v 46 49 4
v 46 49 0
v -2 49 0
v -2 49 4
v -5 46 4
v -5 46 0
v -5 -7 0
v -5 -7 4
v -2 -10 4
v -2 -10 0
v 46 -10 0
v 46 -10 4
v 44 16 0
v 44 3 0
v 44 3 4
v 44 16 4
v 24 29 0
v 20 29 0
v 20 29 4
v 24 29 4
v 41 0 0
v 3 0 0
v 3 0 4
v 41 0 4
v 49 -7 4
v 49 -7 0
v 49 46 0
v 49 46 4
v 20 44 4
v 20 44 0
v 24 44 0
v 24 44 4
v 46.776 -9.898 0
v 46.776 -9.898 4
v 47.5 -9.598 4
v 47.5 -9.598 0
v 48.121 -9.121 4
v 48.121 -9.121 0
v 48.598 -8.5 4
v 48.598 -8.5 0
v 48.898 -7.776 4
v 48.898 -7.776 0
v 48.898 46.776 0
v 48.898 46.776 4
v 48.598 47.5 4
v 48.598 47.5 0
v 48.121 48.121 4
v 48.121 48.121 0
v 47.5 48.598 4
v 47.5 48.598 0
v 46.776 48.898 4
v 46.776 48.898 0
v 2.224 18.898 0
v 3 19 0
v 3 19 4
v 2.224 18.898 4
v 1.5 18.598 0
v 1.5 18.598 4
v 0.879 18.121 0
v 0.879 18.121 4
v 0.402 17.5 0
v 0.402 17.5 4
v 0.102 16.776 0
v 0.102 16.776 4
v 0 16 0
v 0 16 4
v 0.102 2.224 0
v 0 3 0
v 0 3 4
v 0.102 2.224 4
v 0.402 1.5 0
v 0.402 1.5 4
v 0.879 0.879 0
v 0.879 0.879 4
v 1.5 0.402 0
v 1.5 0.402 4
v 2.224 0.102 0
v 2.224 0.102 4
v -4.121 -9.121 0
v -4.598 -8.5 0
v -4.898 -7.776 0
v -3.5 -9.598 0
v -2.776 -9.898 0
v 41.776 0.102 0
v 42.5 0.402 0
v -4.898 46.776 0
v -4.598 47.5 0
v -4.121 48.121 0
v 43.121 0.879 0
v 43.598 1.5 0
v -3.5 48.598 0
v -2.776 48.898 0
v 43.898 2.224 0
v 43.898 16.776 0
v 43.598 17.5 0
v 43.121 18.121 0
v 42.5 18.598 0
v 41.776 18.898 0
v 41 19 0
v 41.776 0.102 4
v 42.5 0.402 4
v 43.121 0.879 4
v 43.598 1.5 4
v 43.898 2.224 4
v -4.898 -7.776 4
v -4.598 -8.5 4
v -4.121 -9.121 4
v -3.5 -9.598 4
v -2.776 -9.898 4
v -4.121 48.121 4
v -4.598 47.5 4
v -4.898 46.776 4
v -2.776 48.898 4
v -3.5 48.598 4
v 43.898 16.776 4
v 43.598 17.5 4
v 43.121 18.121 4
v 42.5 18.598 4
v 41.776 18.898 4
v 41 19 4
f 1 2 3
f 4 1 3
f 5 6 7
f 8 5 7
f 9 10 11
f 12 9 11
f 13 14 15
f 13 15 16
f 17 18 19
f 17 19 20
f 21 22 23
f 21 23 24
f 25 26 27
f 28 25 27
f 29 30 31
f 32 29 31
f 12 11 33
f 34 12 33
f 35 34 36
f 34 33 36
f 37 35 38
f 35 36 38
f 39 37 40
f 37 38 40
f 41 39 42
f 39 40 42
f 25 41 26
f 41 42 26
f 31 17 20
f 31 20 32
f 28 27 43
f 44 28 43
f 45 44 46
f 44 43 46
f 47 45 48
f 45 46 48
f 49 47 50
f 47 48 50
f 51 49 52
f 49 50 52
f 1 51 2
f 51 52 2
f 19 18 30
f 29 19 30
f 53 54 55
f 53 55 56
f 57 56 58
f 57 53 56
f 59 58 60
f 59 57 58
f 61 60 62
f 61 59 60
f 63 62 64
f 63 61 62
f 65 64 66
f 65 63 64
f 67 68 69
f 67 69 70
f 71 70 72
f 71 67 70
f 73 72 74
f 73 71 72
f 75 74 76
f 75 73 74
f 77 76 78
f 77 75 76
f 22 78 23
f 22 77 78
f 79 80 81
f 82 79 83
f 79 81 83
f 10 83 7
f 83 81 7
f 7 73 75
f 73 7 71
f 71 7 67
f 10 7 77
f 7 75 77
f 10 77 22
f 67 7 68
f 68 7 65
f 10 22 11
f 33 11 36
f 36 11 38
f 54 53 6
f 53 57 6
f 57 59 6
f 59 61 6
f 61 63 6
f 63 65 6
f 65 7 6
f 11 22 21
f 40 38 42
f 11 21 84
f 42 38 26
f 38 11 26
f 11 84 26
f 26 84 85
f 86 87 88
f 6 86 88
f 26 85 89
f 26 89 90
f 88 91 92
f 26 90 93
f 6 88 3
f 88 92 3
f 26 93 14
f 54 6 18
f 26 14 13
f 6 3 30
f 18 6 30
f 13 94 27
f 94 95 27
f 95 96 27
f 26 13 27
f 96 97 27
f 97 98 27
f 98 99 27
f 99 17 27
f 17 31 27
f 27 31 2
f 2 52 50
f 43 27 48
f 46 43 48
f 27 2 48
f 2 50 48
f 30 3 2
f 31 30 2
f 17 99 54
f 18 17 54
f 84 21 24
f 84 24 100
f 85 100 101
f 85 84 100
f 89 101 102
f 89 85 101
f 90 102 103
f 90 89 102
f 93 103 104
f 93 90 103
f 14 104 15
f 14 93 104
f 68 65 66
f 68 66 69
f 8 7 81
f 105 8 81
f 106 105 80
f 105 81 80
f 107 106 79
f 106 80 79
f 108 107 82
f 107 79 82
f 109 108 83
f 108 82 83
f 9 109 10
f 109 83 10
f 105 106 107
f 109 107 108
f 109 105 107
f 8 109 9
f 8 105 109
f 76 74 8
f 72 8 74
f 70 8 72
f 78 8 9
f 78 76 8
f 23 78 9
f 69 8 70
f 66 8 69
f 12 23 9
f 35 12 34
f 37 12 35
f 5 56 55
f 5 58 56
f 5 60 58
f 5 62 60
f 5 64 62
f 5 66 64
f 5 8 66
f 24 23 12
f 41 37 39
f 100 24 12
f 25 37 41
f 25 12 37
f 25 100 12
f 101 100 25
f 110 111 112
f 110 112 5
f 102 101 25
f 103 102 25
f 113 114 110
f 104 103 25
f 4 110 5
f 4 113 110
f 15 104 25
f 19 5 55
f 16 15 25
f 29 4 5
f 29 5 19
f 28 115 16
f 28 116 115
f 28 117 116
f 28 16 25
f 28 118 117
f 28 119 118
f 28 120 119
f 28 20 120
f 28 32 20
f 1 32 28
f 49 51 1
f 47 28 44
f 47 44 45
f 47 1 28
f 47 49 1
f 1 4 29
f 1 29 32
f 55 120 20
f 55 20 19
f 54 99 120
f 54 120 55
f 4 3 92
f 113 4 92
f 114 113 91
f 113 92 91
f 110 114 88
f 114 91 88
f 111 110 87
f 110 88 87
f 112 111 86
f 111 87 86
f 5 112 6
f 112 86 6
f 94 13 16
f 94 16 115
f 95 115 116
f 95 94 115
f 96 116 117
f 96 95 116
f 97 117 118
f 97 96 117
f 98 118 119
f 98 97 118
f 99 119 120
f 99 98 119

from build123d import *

# Parameters (mm, degrees)
SKETCH1_W           = 4
SKETCH1_H           = 15
BOSS_EXTRUDE1_DEPTH = 4


with BuildPart() as part:
    # Sketch1 → Boss-Extrude1 (new body)
    with BuildSketch(Plane.XY):
        with BuildLine():
            Line((-2, -10), (46, -10))
            ThreePointArc((46, -10), (48.121320344, -9.121320344), (49, -7))
            Line((49, -7), (49, 46))
            ThreePointArc((49, 46), (48.121320344, 48.121320344), (46, 49))
            Line((46, 49), (-2, 49))
            ThreePointArc((-2, 49), (-4.121320344, 48.121320344), (-5, 46))
            Line((-5, 46), (-5, -7))
            ThreePointArc((-5, -7), (-4.121320344, -9.121320344), (-2, -10))
        make_face()
        with BuildLine():
            Line((3, 0), (41, 0))
            ThreePointArc((41, 0), (43.121320344, 0.878679656), (44, 3))
            Line((44, 3), (44, 16))
            ThreePointArc((44, 16), (43.121320344, 18.121320344), (41, 19))
            Line((41, 19), (3, 19))
            ThreePointArc((3, 19), (0.878679656, 18.121320344), (0, 16))
            Line((0, 16), (0, 3))
            ThreePointArc((0, 3), (0.878679656, 0.878679656), (3, 0))
        make_face(mode=Mode.SUBTRACT)
        with Locations((22, 36.5)):
            Rectangle(SKETCH1_W, SKETCH1_H, mode=Mode.SUBTRACT)
    extrude(amount=BOSS_EXTRUDE1_DEPTH)


solid = part.part
